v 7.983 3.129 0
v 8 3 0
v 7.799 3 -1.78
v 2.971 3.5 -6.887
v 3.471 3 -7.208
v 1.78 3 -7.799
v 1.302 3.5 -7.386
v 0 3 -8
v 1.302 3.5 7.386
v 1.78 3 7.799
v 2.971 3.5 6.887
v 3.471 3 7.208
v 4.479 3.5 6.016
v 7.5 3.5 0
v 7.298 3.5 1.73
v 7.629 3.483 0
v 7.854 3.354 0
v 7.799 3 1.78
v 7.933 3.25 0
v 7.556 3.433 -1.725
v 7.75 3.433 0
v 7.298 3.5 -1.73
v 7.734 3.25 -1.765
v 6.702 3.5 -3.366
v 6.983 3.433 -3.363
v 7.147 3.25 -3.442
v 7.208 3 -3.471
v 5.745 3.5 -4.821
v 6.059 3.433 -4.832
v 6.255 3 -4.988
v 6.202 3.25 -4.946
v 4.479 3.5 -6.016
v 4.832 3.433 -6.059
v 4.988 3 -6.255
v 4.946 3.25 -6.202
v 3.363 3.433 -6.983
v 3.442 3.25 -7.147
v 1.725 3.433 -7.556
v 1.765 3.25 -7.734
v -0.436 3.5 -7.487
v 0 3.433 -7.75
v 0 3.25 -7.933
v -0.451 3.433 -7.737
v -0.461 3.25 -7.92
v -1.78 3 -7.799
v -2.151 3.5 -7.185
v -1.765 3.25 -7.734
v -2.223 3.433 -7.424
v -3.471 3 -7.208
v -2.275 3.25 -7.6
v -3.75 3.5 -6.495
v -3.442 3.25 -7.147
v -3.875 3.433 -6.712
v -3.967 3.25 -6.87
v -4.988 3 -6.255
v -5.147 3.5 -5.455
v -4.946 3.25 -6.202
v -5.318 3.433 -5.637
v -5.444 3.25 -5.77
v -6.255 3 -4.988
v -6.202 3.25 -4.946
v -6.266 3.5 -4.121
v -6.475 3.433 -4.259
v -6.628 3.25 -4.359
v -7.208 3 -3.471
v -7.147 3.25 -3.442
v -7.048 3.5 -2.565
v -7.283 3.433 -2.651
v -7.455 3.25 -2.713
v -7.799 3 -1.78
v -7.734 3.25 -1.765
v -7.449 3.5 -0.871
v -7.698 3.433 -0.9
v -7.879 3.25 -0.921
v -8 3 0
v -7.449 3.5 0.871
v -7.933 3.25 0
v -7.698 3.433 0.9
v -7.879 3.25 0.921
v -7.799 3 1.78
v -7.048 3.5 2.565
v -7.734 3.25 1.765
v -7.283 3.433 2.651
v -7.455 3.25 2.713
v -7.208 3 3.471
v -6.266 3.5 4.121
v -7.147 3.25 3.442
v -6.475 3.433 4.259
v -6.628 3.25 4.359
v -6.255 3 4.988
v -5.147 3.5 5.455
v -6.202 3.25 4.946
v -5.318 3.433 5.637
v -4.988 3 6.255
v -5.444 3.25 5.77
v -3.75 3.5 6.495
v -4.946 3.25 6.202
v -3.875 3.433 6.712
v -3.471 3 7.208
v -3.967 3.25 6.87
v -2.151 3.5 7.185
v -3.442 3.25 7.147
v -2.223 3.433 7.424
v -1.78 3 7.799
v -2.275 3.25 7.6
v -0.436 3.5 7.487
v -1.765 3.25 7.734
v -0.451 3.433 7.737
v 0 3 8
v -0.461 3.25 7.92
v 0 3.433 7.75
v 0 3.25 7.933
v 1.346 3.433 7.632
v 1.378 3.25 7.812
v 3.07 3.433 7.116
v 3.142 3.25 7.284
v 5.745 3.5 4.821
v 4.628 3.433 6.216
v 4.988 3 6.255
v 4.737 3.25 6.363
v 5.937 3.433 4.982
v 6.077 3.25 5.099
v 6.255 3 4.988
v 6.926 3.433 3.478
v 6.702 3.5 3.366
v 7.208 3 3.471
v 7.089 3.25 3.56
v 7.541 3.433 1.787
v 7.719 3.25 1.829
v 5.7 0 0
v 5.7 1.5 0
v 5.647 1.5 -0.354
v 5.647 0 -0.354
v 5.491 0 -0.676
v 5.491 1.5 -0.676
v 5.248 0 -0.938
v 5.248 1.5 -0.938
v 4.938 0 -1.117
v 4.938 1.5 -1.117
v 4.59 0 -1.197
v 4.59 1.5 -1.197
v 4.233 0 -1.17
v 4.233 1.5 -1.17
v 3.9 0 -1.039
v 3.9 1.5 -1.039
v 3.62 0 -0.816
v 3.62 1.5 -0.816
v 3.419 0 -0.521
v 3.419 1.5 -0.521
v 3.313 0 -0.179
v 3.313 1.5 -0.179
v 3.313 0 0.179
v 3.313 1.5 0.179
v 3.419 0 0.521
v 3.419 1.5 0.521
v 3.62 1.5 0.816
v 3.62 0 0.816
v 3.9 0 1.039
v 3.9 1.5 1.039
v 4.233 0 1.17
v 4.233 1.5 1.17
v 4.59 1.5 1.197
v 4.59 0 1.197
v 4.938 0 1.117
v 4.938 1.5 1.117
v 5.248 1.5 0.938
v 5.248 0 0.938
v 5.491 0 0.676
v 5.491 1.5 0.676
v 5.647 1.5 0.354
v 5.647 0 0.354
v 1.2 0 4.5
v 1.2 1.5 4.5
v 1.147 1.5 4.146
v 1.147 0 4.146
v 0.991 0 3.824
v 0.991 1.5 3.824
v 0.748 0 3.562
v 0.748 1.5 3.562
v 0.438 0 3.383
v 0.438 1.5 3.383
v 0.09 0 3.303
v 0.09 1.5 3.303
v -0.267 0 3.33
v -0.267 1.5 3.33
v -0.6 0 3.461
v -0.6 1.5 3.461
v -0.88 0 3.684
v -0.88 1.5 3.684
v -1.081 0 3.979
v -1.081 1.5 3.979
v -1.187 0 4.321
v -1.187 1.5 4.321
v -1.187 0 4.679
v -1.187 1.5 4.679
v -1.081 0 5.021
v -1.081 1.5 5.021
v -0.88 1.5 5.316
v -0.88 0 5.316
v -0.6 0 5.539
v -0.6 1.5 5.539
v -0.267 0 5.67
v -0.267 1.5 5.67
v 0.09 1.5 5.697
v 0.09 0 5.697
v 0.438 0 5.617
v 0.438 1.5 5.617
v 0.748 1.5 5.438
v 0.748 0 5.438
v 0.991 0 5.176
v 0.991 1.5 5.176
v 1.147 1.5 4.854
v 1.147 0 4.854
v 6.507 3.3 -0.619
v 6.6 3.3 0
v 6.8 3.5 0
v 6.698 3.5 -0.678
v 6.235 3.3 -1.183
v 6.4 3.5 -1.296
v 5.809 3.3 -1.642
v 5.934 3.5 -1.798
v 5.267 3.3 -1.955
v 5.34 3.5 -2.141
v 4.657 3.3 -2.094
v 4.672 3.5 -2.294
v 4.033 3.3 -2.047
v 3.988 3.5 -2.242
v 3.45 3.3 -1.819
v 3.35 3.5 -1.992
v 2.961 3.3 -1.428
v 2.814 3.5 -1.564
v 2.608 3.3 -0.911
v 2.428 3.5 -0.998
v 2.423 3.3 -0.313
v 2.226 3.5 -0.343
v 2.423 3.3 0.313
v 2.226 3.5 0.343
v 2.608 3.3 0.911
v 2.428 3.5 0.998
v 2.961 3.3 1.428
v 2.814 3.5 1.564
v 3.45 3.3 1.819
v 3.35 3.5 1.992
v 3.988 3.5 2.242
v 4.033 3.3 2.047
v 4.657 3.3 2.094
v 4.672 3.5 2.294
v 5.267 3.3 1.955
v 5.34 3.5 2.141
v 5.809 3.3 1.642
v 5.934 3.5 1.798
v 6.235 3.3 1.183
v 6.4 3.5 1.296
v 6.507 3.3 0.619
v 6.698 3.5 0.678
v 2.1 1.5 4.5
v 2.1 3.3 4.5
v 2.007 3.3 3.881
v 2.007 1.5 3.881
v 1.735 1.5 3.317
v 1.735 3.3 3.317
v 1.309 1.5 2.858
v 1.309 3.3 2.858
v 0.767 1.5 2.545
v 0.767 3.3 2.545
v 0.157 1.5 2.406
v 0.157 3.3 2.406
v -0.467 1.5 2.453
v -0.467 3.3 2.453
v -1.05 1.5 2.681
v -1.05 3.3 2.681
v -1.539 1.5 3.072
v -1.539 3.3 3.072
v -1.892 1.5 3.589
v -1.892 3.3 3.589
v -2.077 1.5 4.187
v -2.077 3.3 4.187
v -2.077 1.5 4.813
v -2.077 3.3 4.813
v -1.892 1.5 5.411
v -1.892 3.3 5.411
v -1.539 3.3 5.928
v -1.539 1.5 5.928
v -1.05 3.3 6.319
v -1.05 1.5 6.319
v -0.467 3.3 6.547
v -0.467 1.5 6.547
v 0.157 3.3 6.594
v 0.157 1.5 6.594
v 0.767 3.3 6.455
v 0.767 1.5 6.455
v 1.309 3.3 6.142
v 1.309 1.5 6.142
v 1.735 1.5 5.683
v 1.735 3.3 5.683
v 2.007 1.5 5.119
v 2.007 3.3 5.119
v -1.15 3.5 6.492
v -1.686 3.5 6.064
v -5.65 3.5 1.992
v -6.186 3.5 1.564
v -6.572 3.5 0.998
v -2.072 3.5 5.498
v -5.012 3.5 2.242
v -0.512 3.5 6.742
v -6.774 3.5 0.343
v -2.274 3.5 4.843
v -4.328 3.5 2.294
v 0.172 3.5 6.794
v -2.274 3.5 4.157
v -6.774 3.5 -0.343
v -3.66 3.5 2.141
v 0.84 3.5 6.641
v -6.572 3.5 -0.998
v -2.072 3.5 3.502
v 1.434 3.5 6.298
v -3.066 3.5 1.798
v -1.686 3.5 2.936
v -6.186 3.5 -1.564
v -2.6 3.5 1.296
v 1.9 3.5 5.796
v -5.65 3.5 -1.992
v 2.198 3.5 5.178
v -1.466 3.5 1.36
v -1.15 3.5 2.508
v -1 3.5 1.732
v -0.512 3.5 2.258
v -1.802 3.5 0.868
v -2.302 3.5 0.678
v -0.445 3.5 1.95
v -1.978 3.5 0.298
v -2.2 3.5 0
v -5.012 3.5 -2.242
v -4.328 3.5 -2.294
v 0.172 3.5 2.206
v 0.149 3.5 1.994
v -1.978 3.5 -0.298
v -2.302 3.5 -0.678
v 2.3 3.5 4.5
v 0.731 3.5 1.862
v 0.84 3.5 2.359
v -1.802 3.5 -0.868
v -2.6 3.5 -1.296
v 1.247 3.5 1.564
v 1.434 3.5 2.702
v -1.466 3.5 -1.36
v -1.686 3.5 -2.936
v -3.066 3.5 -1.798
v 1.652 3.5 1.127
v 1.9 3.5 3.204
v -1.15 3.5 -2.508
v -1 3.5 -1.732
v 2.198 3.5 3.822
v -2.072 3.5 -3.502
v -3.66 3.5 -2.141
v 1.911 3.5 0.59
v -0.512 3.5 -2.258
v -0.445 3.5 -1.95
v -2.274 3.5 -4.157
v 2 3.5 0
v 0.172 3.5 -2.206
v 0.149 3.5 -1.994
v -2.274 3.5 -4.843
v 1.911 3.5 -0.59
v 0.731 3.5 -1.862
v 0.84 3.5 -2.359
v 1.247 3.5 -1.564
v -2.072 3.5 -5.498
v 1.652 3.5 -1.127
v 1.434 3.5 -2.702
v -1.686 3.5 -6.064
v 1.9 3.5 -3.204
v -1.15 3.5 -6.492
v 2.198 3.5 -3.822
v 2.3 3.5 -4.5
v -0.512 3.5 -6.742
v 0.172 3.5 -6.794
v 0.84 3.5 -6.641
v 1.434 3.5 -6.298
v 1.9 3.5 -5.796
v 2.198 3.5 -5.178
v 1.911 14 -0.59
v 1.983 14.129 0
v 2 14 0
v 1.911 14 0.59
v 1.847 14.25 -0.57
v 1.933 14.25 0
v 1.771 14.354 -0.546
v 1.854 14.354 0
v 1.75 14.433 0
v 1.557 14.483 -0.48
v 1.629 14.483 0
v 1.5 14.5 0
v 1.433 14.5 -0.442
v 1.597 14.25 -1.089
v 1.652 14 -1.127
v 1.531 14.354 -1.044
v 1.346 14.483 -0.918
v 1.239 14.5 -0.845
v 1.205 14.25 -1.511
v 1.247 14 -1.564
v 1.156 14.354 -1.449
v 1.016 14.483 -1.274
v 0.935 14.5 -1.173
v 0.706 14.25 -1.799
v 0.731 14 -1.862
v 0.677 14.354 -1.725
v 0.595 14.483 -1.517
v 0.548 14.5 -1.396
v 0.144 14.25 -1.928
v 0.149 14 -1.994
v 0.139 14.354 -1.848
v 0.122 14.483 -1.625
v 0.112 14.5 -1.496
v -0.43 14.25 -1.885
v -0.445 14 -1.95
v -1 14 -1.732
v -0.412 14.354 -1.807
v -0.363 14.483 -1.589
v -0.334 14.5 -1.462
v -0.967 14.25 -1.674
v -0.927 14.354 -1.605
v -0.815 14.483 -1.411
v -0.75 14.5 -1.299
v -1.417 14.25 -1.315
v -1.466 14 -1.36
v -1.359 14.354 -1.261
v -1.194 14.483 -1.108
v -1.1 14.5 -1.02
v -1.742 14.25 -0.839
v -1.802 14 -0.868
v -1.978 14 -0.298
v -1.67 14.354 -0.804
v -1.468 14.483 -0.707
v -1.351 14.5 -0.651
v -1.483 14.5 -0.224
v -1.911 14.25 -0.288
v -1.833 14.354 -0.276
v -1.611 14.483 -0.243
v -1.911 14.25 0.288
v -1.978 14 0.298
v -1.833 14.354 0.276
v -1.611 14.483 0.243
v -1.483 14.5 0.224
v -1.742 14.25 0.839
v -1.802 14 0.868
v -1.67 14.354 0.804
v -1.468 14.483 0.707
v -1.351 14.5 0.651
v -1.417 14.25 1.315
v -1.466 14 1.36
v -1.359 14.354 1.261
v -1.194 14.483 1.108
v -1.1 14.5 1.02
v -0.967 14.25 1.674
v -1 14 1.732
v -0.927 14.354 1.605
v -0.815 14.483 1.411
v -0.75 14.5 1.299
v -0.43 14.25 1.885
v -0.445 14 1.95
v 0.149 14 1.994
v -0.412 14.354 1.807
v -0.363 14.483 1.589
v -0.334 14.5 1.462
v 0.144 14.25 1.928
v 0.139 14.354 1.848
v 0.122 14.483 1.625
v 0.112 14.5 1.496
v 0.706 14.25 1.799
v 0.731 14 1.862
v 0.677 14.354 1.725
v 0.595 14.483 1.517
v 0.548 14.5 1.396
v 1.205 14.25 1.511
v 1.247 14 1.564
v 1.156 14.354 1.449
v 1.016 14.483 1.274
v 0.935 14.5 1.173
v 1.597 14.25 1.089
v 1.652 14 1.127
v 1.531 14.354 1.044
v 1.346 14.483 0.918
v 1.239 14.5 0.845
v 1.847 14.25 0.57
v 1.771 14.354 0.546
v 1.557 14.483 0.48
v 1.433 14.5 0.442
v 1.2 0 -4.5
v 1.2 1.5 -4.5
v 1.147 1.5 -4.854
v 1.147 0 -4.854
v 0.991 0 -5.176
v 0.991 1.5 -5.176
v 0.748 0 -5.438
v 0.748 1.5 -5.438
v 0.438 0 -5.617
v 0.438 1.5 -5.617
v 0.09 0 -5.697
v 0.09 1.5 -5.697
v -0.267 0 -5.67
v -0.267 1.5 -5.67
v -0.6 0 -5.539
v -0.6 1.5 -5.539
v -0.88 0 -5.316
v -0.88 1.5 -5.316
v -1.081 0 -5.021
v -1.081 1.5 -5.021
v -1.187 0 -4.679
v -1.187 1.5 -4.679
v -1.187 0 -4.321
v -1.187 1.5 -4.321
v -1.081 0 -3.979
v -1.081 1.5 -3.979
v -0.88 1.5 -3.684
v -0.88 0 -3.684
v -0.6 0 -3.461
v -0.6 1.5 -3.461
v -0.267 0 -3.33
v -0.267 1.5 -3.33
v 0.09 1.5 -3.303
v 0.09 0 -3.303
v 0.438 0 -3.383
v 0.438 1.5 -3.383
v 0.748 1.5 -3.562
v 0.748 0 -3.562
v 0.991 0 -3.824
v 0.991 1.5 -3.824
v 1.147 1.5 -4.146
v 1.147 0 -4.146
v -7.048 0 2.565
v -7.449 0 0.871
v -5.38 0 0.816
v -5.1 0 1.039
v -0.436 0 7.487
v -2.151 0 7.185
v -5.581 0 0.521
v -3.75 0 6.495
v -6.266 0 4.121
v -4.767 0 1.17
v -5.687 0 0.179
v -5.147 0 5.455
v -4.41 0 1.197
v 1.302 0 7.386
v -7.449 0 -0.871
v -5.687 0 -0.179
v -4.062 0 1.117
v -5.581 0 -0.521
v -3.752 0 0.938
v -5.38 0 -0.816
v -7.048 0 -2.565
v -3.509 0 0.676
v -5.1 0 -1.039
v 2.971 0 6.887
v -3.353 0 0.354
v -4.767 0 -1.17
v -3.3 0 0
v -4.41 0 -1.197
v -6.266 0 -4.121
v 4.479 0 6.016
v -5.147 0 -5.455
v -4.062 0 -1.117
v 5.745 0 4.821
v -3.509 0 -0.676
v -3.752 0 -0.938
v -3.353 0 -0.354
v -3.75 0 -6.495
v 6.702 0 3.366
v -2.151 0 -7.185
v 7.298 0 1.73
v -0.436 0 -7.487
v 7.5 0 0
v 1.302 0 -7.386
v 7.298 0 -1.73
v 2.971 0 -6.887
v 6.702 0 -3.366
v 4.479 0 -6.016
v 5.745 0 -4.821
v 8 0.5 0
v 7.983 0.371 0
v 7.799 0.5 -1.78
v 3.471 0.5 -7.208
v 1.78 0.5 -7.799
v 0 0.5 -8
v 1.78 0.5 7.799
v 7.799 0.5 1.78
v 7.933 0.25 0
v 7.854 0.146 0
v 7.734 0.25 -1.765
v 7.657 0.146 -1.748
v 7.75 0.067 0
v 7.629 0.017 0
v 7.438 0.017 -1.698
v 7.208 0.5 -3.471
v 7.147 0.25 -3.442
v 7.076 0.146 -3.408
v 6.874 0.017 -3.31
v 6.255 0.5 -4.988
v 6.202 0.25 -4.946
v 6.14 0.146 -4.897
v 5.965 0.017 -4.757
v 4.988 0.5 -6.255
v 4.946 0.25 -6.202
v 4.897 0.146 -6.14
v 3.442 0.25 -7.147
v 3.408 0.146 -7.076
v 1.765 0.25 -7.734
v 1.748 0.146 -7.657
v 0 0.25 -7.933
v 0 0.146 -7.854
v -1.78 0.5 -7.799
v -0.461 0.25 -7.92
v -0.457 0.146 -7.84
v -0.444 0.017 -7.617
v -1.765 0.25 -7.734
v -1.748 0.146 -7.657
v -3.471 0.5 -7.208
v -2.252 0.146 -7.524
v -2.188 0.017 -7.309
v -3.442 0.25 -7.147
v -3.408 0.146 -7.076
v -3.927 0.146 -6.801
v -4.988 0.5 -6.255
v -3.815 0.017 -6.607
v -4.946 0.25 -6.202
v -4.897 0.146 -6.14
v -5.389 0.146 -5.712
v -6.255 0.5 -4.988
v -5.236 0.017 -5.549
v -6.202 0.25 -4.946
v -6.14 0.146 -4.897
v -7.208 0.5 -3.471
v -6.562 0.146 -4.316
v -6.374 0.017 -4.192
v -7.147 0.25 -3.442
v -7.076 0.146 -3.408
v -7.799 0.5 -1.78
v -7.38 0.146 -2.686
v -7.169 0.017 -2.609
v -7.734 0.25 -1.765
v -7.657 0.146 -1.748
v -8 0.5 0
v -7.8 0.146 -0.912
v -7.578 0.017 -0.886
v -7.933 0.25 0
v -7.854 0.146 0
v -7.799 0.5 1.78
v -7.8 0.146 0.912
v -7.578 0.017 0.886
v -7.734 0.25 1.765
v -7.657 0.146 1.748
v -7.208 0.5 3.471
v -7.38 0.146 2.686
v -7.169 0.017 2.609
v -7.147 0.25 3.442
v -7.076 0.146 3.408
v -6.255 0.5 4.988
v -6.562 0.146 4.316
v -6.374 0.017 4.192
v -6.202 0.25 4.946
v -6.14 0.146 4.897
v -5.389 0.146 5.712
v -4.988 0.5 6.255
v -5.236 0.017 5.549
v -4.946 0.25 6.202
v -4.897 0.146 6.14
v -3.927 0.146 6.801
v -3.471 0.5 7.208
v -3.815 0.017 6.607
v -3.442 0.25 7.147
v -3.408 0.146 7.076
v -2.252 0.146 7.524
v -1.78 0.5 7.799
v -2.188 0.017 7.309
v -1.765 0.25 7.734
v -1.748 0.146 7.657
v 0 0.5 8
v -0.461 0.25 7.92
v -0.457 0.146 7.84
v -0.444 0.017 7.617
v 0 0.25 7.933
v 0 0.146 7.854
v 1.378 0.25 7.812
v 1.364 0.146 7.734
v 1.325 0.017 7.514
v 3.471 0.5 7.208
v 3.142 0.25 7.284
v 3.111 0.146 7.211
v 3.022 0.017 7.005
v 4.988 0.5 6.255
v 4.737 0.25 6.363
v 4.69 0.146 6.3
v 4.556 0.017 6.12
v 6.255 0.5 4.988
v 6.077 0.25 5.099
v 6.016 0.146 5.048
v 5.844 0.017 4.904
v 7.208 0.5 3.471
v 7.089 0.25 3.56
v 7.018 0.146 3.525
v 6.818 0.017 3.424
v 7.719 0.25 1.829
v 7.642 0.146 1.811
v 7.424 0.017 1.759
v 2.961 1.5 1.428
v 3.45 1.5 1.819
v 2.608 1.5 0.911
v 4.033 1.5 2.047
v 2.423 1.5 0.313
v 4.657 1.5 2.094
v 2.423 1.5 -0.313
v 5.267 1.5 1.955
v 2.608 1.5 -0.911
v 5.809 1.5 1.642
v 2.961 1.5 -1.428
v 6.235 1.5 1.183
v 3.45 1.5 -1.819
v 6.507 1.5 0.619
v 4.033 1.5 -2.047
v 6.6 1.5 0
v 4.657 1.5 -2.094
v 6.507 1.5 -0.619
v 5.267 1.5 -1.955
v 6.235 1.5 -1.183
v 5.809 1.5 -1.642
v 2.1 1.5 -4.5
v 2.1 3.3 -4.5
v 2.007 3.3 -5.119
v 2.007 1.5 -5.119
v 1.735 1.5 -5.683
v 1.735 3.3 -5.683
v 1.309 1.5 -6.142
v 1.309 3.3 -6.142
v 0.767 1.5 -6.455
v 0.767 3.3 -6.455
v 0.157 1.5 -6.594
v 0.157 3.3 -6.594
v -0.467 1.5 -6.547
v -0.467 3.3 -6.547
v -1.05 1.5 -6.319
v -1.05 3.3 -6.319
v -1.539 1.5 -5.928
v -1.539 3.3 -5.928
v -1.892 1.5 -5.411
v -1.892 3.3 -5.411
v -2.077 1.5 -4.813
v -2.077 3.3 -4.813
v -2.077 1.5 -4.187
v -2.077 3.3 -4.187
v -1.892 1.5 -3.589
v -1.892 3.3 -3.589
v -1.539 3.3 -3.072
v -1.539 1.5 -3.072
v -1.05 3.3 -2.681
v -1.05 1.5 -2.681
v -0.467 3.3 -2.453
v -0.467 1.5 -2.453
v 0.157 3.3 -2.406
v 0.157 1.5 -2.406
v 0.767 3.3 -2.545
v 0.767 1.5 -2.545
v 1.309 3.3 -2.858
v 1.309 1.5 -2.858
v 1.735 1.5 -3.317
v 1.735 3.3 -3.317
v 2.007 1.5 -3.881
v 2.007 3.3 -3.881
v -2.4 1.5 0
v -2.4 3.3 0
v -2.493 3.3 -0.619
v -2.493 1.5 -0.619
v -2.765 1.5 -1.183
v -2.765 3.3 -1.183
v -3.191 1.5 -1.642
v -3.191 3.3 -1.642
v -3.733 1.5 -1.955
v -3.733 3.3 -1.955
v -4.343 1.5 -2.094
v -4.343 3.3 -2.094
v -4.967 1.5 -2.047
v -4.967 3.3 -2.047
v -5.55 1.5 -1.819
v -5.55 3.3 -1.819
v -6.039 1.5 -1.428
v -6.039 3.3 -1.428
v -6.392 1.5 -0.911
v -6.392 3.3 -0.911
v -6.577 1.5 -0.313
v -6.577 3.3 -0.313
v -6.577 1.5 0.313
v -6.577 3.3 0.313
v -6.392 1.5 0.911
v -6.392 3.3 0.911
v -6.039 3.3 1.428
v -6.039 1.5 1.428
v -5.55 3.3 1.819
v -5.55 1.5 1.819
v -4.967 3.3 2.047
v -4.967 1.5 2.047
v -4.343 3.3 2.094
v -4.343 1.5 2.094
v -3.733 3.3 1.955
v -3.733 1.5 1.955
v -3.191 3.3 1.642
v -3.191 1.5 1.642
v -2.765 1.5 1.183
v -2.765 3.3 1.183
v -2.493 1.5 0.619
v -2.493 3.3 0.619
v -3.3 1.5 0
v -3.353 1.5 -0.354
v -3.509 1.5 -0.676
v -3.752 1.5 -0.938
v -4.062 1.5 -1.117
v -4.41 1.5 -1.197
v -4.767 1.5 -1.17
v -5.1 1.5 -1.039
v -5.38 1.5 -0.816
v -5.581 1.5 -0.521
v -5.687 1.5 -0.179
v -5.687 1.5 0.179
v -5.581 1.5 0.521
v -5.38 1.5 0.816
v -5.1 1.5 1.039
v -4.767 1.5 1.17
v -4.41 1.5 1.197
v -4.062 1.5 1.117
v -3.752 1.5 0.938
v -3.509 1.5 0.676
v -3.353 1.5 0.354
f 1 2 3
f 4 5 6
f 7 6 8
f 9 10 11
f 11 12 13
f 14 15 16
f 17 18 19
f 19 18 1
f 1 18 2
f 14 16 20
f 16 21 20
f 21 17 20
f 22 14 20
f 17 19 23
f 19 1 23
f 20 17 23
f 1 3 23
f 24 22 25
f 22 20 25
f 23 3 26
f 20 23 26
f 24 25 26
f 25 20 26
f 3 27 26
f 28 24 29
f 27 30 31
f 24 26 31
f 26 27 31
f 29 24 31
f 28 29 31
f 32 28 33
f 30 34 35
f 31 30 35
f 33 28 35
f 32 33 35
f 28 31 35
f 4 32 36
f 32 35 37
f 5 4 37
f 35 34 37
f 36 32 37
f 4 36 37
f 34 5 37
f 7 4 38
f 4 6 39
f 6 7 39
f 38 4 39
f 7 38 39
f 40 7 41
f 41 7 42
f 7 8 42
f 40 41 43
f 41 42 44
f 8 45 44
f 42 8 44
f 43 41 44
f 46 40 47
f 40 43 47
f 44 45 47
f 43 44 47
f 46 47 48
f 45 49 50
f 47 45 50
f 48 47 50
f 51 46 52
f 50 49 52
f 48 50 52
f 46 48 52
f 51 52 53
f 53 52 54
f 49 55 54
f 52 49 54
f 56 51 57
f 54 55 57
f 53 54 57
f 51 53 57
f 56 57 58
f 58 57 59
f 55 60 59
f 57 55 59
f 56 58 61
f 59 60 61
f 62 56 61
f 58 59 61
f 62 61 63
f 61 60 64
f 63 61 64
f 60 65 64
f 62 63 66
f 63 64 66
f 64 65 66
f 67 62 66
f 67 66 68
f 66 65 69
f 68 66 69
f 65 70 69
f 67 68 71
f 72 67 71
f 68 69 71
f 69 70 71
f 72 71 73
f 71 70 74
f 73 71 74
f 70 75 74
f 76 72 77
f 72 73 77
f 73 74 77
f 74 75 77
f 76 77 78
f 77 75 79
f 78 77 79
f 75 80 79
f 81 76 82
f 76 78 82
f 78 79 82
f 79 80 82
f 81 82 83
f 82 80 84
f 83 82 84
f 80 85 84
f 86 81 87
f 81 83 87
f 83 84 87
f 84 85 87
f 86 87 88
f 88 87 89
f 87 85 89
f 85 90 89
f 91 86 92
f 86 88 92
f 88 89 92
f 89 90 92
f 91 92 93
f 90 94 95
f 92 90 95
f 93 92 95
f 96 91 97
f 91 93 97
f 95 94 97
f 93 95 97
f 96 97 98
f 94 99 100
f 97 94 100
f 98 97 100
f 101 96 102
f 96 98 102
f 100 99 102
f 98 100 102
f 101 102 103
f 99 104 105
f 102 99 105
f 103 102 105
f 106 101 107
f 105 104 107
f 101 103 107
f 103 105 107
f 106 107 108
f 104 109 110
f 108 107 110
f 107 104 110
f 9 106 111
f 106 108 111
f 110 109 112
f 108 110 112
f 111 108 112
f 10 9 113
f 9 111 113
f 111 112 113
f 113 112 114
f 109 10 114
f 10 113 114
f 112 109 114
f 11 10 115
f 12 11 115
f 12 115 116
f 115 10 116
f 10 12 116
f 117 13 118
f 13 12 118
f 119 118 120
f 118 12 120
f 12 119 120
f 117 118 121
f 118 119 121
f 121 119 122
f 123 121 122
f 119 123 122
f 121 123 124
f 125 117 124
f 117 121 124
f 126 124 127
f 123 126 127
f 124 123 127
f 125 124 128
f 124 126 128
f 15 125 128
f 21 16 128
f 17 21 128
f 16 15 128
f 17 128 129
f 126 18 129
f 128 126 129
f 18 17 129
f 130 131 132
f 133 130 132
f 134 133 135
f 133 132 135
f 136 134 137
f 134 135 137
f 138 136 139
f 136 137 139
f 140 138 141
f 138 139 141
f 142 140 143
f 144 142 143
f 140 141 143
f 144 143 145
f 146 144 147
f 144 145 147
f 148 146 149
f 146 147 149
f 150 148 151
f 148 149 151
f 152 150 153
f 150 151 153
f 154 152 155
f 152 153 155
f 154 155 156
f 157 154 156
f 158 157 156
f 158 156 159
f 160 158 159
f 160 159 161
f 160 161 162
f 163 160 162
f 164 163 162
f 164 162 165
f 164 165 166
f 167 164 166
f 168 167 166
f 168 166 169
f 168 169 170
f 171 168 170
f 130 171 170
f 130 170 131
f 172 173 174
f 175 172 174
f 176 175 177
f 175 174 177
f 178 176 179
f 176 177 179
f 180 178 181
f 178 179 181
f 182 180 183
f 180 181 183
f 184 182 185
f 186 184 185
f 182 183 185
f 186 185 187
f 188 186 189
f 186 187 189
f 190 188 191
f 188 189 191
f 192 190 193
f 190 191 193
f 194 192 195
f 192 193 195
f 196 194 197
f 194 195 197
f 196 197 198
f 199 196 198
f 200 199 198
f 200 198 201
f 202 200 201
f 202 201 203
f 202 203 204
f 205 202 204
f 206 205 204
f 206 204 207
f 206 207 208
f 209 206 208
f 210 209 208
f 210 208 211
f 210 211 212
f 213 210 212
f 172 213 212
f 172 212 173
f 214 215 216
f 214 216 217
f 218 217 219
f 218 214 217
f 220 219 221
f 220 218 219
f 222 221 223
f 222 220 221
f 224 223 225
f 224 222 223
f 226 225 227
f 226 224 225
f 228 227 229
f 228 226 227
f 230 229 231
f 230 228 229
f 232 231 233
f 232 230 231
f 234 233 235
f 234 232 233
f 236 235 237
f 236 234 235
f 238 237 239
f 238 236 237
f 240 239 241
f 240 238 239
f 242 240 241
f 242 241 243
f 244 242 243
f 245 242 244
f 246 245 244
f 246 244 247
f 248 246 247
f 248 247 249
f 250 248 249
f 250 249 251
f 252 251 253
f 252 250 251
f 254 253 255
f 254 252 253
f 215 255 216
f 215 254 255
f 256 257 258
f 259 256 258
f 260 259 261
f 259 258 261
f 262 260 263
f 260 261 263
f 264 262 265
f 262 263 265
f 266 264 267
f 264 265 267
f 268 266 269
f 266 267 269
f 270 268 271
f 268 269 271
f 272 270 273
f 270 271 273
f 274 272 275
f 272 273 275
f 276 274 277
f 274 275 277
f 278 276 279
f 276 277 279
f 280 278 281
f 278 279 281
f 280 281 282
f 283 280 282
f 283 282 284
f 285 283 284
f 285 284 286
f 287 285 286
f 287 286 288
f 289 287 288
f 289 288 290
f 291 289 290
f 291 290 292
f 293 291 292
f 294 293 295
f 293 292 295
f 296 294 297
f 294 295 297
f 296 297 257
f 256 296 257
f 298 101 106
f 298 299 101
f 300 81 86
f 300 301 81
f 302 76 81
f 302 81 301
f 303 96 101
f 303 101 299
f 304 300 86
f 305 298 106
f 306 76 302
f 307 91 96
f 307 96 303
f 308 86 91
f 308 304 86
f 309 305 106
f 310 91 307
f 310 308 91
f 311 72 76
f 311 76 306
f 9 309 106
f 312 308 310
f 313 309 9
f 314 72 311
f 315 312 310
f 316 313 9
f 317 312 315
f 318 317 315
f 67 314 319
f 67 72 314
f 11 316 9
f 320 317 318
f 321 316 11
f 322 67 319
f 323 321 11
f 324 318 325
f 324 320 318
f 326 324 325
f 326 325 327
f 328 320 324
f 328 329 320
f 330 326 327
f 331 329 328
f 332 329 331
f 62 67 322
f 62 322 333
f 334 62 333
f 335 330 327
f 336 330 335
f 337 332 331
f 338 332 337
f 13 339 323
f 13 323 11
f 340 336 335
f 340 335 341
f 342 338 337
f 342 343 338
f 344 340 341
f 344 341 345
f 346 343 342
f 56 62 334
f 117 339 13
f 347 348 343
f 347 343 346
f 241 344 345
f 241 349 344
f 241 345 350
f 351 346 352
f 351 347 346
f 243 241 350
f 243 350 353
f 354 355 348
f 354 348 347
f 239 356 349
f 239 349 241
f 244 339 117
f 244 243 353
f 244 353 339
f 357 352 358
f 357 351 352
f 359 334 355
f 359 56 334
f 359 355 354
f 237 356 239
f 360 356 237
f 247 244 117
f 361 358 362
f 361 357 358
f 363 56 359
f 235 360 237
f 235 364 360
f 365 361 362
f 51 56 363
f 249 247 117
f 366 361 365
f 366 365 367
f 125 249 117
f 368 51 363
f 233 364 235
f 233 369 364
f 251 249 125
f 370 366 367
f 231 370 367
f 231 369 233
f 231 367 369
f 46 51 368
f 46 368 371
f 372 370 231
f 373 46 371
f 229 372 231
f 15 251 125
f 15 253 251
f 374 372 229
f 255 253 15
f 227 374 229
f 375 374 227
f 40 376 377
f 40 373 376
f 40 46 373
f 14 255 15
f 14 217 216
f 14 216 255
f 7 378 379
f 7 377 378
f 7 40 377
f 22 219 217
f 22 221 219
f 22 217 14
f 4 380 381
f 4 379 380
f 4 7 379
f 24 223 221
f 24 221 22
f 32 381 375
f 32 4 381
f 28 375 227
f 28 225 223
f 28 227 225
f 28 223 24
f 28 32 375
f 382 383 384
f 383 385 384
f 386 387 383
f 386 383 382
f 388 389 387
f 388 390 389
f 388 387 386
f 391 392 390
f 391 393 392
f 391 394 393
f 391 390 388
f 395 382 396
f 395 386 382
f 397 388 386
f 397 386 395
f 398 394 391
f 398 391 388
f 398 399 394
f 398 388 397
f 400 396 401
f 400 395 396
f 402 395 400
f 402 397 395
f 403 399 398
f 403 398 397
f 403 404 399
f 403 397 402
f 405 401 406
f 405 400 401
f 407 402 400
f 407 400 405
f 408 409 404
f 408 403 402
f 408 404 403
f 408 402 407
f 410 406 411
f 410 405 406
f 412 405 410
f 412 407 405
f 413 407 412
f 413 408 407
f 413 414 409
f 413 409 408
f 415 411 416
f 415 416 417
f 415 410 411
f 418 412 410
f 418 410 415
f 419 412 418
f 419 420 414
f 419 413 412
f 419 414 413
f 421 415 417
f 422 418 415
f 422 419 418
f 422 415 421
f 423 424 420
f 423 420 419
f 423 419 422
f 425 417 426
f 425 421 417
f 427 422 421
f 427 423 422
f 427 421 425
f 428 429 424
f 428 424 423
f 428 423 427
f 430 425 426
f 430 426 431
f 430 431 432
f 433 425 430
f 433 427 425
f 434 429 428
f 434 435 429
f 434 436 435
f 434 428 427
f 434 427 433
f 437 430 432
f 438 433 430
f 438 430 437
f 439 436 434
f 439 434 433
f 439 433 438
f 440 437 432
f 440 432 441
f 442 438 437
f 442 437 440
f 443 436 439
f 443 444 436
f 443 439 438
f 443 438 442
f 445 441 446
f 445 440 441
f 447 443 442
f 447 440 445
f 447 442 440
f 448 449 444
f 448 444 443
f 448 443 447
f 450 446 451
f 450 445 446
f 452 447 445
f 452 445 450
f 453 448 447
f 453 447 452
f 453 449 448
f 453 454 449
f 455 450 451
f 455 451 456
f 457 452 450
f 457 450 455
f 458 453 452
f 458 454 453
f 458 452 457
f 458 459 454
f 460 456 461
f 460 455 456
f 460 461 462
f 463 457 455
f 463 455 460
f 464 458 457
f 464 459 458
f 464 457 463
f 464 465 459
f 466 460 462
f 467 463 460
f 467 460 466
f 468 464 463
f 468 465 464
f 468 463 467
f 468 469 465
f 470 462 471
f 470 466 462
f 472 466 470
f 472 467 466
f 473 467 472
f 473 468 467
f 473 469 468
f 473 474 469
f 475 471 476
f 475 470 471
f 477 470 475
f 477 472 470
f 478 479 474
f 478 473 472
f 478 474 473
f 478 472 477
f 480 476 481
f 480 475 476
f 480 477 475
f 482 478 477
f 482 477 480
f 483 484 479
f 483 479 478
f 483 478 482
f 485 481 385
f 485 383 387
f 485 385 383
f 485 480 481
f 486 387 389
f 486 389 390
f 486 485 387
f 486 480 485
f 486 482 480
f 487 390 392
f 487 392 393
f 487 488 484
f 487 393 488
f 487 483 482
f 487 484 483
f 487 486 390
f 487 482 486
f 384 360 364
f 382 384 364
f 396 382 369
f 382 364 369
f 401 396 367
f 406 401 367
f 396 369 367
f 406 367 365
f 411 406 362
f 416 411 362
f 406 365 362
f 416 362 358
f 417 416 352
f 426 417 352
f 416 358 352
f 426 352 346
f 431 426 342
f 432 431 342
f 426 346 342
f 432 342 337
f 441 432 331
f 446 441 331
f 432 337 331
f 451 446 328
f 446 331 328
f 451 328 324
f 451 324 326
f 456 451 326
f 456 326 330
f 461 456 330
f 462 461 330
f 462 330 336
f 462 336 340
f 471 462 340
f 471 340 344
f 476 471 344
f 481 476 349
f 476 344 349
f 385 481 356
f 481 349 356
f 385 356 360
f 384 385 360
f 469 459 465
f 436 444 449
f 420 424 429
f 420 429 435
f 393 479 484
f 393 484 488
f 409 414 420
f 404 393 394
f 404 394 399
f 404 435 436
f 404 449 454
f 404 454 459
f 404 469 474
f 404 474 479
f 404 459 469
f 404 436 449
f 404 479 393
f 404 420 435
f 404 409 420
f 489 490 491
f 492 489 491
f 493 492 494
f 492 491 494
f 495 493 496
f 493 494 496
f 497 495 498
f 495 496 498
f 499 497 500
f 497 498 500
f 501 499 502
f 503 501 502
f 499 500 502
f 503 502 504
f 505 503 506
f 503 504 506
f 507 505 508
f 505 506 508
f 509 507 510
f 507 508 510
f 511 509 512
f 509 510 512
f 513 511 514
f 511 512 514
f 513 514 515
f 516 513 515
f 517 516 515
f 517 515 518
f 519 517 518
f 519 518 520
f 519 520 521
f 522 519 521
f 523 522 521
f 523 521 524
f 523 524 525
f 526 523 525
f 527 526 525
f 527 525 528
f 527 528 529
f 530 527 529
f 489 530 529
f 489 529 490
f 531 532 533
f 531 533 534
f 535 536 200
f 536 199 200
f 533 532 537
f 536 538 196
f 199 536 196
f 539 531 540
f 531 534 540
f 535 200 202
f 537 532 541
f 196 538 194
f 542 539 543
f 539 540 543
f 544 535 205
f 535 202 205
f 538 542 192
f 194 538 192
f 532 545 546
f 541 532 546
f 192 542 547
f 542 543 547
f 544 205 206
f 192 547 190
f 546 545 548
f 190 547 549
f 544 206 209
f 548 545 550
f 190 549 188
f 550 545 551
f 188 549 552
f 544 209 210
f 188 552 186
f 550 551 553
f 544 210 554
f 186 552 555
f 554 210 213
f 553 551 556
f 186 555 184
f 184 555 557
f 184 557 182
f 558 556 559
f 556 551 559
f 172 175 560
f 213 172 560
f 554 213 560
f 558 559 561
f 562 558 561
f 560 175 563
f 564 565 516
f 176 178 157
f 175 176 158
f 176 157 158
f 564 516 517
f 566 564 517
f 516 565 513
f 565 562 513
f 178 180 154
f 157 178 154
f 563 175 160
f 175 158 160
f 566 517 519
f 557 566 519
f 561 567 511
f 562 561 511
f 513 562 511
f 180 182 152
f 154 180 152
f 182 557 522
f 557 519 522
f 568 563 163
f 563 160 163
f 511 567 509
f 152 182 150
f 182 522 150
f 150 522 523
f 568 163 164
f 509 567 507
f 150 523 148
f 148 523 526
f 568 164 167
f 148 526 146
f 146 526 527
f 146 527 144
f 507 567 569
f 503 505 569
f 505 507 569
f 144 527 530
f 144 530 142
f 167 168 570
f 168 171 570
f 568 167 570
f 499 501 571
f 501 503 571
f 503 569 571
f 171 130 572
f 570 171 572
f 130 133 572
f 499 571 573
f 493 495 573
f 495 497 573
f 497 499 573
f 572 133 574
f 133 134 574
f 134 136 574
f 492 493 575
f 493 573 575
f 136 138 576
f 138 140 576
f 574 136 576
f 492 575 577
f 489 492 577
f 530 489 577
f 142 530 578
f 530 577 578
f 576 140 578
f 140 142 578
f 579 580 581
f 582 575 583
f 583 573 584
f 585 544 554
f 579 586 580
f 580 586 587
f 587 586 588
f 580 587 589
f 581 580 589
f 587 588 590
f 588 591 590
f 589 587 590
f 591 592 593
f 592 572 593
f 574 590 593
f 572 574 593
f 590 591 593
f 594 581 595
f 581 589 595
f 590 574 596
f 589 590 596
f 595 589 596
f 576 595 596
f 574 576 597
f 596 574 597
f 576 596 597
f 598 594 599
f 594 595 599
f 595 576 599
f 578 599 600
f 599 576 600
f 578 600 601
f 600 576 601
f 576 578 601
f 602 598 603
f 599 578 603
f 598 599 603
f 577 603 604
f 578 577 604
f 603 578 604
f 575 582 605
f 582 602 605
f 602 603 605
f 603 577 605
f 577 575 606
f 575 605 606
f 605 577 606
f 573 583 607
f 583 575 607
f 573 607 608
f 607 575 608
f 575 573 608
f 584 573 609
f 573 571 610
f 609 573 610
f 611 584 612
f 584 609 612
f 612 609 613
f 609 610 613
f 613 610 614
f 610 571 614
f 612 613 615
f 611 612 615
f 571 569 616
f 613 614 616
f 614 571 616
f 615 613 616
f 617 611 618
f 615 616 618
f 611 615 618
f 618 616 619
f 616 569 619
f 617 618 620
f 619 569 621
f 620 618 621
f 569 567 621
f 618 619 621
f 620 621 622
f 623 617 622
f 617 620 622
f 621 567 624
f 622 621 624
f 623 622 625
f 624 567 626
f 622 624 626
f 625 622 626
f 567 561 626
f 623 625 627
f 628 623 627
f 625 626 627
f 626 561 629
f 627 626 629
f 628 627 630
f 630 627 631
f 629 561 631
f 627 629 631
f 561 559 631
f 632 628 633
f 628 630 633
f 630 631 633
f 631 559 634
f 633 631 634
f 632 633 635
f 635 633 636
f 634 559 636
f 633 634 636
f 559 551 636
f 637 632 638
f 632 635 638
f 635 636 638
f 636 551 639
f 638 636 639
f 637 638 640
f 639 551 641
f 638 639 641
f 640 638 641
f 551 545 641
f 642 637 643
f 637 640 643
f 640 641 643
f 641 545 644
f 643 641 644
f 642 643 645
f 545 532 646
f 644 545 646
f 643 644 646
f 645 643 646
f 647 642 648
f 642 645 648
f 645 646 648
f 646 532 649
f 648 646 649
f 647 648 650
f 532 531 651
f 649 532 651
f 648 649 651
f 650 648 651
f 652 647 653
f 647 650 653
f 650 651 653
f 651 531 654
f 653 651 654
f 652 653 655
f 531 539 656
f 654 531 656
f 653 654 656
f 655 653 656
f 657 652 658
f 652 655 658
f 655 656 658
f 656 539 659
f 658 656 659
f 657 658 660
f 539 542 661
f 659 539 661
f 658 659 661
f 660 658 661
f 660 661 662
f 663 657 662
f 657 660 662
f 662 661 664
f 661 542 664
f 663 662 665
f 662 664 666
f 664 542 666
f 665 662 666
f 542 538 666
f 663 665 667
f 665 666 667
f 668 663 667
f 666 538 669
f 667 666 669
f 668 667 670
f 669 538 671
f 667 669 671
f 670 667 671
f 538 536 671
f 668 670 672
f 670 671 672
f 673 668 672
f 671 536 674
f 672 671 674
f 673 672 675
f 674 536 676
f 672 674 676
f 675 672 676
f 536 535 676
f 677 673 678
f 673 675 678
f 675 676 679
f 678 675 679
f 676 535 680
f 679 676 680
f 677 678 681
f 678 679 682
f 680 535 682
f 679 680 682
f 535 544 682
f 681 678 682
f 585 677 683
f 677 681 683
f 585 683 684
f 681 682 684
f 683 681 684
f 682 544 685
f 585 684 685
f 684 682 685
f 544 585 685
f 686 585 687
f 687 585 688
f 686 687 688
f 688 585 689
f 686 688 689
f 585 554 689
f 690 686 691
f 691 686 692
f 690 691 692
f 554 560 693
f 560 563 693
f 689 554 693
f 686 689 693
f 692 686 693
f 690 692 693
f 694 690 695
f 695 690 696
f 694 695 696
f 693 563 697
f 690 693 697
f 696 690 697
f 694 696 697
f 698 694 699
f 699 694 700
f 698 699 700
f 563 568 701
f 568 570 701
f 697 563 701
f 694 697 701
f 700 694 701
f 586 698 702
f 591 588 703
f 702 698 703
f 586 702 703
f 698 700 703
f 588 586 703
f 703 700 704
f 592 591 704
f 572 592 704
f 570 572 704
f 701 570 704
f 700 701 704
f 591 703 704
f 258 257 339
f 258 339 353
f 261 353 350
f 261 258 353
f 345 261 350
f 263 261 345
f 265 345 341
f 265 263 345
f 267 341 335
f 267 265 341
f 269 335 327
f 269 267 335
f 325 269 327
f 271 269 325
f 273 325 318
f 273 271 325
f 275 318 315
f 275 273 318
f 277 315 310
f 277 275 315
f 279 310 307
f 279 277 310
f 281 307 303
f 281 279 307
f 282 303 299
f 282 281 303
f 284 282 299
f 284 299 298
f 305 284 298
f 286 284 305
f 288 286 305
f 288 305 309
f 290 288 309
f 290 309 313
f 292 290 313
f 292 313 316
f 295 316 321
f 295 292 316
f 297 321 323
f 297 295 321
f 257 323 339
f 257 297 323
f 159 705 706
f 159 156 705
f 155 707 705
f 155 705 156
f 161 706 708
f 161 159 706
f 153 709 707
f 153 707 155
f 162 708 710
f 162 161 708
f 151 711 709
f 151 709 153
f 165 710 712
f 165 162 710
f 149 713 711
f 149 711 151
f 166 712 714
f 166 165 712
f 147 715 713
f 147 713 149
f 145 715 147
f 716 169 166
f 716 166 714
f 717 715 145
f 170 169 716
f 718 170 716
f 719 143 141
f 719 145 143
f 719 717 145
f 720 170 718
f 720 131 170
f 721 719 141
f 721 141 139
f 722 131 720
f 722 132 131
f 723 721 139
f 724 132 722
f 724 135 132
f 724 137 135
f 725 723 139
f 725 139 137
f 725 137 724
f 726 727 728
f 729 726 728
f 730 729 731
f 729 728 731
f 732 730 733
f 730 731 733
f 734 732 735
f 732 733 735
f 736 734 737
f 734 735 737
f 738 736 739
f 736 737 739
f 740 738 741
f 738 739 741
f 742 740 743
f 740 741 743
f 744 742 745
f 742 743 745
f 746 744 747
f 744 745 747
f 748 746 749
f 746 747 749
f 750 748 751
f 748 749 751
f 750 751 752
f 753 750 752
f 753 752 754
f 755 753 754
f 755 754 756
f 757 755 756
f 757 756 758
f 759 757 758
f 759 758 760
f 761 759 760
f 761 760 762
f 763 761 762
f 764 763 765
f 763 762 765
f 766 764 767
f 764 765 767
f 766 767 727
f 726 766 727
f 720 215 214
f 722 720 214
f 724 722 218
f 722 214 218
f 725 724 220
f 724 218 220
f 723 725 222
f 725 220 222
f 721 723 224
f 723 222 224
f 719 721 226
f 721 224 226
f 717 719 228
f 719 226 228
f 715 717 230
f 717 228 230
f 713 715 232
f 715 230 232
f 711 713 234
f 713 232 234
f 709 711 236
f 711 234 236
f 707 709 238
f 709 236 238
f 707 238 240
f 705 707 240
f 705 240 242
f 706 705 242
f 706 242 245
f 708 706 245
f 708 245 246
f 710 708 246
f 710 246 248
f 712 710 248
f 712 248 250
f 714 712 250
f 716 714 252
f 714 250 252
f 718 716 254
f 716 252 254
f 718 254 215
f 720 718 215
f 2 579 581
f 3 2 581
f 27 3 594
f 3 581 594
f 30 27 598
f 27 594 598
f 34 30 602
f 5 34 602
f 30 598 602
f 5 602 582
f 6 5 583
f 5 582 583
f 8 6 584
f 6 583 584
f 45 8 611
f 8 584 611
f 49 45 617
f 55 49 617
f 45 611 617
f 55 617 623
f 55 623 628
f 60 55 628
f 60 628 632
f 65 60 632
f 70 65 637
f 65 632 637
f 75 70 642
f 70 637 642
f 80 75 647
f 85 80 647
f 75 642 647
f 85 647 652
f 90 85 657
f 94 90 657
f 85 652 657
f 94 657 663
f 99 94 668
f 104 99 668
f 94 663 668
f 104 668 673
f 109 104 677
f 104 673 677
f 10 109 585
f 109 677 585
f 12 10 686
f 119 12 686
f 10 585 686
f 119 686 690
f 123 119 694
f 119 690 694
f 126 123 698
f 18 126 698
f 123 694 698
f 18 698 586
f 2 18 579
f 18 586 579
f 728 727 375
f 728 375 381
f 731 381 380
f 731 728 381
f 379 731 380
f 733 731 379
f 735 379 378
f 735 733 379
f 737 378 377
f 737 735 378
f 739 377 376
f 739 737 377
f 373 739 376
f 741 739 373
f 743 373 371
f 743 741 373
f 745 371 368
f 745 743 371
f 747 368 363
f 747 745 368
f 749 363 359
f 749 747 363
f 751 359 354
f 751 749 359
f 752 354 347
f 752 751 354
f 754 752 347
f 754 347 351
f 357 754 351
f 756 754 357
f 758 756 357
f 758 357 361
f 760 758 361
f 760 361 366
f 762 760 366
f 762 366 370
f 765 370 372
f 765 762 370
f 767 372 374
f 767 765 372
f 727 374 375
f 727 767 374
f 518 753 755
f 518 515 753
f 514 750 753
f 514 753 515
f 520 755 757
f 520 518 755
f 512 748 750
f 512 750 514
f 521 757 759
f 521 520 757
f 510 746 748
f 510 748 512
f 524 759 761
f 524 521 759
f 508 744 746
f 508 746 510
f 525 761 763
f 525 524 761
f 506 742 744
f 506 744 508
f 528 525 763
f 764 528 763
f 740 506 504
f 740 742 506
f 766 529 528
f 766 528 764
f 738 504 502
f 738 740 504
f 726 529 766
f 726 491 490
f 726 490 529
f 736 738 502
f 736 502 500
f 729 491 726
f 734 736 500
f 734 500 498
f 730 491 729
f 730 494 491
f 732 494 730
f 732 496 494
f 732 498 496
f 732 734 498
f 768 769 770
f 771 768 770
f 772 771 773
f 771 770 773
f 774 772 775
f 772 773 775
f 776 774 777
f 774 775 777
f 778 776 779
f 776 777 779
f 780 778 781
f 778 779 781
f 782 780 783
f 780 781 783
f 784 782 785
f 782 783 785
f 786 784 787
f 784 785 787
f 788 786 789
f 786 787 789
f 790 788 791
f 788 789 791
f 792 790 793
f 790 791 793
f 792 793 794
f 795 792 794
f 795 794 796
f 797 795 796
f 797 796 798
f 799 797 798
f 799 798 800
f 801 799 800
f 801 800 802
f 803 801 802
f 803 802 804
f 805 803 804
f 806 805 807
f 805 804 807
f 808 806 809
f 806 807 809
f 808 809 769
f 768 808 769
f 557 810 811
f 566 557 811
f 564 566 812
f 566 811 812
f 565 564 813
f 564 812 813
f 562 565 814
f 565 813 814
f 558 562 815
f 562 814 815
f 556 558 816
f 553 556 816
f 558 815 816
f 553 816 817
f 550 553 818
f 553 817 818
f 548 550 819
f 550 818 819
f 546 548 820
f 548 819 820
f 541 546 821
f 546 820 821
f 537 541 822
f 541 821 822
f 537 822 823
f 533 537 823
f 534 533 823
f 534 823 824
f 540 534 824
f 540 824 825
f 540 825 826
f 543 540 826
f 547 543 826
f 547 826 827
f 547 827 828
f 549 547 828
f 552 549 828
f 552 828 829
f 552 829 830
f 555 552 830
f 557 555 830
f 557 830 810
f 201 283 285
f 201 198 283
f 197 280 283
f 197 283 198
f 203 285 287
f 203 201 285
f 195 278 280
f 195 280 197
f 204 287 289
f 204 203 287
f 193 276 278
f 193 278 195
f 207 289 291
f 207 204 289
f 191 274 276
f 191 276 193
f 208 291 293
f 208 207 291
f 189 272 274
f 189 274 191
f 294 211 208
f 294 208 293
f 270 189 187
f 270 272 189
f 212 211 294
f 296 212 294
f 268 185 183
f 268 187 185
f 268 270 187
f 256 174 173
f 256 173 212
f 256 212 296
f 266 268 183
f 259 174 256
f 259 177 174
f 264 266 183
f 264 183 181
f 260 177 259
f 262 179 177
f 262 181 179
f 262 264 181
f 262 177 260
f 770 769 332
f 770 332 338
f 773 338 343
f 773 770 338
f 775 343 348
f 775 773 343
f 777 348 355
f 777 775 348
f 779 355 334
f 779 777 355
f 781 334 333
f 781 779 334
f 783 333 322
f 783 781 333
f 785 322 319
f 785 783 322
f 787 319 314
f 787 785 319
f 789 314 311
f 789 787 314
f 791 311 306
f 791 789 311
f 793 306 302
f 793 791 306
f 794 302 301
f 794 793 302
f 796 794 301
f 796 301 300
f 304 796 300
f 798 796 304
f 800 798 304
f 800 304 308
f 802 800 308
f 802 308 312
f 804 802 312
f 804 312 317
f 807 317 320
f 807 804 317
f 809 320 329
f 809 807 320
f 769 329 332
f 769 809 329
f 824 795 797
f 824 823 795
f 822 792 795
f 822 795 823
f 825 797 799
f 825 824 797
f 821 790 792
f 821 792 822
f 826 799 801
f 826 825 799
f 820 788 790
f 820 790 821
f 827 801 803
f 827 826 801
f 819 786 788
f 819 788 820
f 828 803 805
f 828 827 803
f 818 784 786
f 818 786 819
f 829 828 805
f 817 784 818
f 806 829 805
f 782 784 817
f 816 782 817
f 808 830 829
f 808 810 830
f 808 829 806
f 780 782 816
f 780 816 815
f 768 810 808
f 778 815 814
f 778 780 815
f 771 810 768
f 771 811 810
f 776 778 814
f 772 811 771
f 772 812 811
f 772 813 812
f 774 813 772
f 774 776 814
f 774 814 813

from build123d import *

# Parameters (mm, degrees)
SKETCH1_R           = 8
BOSS_EXTRUDE1_DEPTH = 3.5
SKETCH2_R           = 2
BOSS_EXTRUDE2_DEPTH = 11
SKETCH4_R           = 1.2
CUT_EXTRUDE1_DEPTH  = 4.5
SKETCH5_R           = 2.1
CUT_EXTRUDE2_DEPTH  = 2
CHAMFER2_SIZE       = 0.2
FILLET3_R           = 0.5
FILLET4_R           = 0.5


with BuildPart() as part:
    # Sketch1 → Boss-Extrude1 (new body)
    with BuildSketch(Plane(origin=(0, 0, 0), x_dir=(1, 0, 0), z_dir=(0, 1, 0))):
        Circle(SKETCH1_R)
    extrude(amount=BOSS_EXTRUDE1_DEPTH)

    # Sketch2 → Boss-Extrude2 (add)
    with BuildSketch(Plane(origin=(0, 3.5, 0), x_dir=(1, 0, 0), z_dir=(0, 1, 0))):
        Circle(SKETCH2_R)
    extrude(amount=BOSS_EXTRUDE2_DEPTH)

    # Sketch4 → Cut-Extrude1 (cut, through all)
    with BuildSketch(Plane(origin=(0, 3.5, 0), x_dir=(1, 0, 0), z_dir=(0, 1, 0))):
        with Locations((0, 4.5)):
            Circle(SKETCH4_R)
        with Locations((4.5, 0)):
            Circle(SKETCH4_R)
        with Locations((0, -4.5)):
            Circle(SKETCH4_R)
        with Locations((-4.5, 0)):
            Circle(SKETCH4_R)
    extrude(amount=-CUT_EXTRUDE1_DEPTH, mode=Mode.SUBTRACT)

    # Sketch5 → Cut-Extrude2 (cut)
    with BuildSketch(Plane(origin=(0, 3.5, 0), x_dir=(1, 0, 0), z_dir=(0, 1, 0))):
        with Locations((0, 4.5)):
            Circle(SKETCH5_R)
        with Locations((4.5, 0)):
            Circle(SKETCH5_R)
        with Locations((0, -4.5)):
            Circle(SKETCH5_R)
        with Locations((-4.5, 0)):
            Circle(SKETCH5_R)
    extrude(amount=-CUT_EXTRUDE2_DEPTH, mode=Mode.SUBTRACT)

    # Chamfer2
    chamfer2_edges = [part.edges().sort_by_distance(p)[0] for p in [
        (-2.1, 3.5, -4.5),
        (2.4, 3.5, 0),
        (-2.1, 3.5, 4.5),
        (-6.6, 3.5, 0),
    ]]
    chamfer(chamfer2_edges, length=CHAMFER2_SIZE)

    # Fillet3
    fillet3_edges = [part.edges().sort_by_distance(p)[0] for p in [
        (-2, 14.5, 0),
    ]]
    fillet(fillet3_edges, radius=FILLET3_R)

    # Fillet4
    fillet4_edges = [part.edges().sort_by_distance(p)[0] for p in [
        (-8, 0, 0),
        (-8, 3.5, 0),
    ]]
    fillet(fillet4_edges, radius=FILLET4_R)


solid = part.part
